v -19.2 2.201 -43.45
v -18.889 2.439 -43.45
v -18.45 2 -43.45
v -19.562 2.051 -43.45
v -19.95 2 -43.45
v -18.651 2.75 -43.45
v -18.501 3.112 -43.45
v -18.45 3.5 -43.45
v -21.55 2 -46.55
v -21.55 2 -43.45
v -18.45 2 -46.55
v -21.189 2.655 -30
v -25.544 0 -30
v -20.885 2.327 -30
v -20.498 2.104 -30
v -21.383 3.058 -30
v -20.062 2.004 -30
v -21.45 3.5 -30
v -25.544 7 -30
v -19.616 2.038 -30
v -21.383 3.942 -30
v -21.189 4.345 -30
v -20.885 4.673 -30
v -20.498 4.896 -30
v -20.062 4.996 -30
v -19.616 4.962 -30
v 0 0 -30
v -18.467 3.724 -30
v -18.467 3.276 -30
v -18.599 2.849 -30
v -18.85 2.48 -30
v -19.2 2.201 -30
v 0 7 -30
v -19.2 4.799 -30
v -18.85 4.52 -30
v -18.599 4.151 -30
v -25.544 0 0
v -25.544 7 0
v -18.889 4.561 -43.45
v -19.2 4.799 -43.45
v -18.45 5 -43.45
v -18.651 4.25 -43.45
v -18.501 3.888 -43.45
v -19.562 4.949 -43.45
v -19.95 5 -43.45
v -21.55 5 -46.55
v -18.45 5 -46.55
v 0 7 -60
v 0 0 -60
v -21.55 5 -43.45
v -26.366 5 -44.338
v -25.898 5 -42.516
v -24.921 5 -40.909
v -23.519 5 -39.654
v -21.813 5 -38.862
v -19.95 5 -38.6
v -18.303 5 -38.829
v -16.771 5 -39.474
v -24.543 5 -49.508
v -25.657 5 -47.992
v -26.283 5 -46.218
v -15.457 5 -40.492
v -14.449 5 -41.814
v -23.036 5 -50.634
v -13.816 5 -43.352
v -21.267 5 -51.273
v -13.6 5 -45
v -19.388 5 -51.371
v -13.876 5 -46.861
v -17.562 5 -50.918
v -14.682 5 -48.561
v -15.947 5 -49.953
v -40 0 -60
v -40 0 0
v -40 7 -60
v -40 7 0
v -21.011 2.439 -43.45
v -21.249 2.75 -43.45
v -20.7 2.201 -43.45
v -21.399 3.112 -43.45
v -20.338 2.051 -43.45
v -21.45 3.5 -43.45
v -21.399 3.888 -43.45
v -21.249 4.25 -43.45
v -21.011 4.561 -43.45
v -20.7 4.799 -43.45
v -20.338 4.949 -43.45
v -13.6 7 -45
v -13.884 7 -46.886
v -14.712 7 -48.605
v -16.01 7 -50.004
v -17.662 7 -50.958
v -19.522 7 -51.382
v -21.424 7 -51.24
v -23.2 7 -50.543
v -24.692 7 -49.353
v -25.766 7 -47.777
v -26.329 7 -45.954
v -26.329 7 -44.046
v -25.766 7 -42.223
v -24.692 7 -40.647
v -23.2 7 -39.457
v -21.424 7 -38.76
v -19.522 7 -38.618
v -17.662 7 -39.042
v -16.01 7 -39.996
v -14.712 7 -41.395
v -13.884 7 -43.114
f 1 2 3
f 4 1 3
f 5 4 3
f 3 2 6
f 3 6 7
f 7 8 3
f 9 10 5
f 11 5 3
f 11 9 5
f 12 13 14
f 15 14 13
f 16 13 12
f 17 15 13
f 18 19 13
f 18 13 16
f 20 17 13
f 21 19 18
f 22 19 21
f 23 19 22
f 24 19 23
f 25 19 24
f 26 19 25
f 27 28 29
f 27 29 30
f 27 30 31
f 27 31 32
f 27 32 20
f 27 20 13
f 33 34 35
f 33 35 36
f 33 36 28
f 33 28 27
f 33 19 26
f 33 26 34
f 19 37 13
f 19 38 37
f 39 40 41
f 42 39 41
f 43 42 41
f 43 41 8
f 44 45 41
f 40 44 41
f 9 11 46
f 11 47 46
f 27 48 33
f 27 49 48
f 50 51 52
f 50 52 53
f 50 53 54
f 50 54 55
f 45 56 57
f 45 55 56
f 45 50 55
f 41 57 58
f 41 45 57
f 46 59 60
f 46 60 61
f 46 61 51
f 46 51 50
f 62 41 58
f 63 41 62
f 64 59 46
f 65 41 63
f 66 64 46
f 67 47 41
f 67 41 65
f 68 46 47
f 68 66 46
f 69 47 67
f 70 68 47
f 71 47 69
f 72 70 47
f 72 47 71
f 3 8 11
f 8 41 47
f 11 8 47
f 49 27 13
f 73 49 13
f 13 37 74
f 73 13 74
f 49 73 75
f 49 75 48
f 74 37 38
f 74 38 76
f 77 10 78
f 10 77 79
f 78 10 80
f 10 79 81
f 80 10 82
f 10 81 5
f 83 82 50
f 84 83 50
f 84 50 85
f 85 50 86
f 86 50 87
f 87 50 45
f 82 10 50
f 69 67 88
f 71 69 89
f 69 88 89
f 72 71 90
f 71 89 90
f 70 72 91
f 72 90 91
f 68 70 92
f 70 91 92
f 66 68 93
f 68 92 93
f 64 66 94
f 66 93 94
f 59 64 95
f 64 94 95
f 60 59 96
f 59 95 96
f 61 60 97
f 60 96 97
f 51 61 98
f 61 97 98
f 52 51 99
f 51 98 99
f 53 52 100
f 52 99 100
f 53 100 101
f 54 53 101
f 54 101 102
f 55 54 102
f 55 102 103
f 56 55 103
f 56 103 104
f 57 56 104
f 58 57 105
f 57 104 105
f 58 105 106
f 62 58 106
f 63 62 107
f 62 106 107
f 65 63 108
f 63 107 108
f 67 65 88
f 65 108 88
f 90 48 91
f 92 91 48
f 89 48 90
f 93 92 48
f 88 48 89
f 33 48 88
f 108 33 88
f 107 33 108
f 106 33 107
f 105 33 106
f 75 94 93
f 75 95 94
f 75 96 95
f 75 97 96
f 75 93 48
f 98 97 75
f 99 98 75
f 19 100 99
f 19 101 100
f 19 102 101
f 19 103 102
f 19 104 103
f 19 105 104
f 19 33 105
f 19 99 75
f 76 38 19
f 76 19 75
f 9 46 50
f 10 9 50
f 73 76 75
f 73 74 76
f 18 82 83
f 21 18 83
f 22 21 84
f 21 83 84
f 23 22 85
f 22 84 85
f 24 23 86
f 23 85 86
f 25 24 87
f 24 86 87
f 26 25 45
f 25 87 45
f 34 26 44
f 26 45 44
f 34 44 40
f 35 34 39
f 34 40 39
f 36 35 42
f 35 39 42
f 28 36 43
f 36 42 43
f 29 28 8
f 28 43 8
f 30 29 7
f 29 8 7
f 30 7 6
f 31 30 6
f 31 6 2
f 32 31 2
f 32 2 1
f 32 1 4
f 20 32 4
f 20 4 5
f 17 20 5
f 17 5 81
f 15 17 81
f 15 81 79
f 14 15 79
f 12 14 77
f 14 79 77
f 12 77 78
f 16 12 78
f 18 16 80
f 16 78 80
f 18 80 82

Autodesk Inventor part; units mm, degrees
ref_plane "YZ Plane" through (0, 0, 0) normal (1, 0, 0) x (0, 1, 0)
ref_plane "XZ Plane" through (0, 0, 0) normal (0, 1, 0) x (-1, 0, 0)
ref_plane "XY Plane" through (0, 0, 0) normal (0, 0, 1) x (1, 0, 0)
sketch "Sketch1" plane through (0, 0, 0) normal (0, 1, 0) x (-1, 0, 0)
  line L0 (0, 0) -> (40, 0)
  line L1 (40, 0) -> (40, -60)
  line L2 (40, -60) -> (0, -60)
  line L3 (0, -60) -> (0, 0)
  dimension "d0" = 40
  dimension "d1" = 60
extrude "Extrusion1" add sketch "Sketch1" along normal blind 7
sketch "Sketch2" plane through (0, 7, 0) normal (0, 1, 0) x (1, 0, 0)
  line L0 (-40, 0) -> (0, 0) projected
  line L1 (0, 0) -> (-25.544, 0)
  line L2 (-25.544, 0) -> (-25.544, 30)
  line L3 (-25.544, 30) -> (0, 30)
  line L4 (0, 30) -> (0, 0)
  dimension "d4" = 25.544
  dimension "d5" = 30
extrude "Extrusion2" cut sketch "Sketch2" against normal through all
sketch "Sketch3" plane through (0, 7, 0) normal (0, 1, 0) x (1, 0, 0)
  circle A0 centre (-20, 45) radius 6.4
  point P0 (0, 0)
  dimension "d8" = 12.8
extrude "Extrusion3" cut sketch "Sketch3" against normal blind 2
sketch "Sketch4" plane through (-20, 5, -45) normal (0, 1, 0) x (1, 0, 0)
  line L0 (-1.55, -1.55) -> (1.55, -1.55)
  line L1 (1.55, -1.55) -> (1.55, 1.55)
  line L2 (1.55, 1.55) -> (-1.55, 1.55)
  line L3 (-1.55, 1.55) -> (-1.55, -1.55)
  line L4 (-1.55, -1.55) -> (1.55, 1.55) construction
  line L5 (1.55, -1.55) -> (-1.55, 1.55) construction
  point P0 (20, -45)
  point P1 (0, 0)
  dimension "d11" = 3.1
  dimension "d12" = 3.1
extrude "Extrusion4" cut sketch "Sketch4" against normal blind 3
sketch "Sketch6" plane through (-18.45, 5, -43.45) normal (0, 0, -1) x (-1, 0, 0)
  circle A0 centre (1.5, -1.5) radius 1.5
  point P0 (-18.45, -5)
  dimension "d18" = 3
extrude "Extrusion6" cut sketch "Sketch6" against normal through all
